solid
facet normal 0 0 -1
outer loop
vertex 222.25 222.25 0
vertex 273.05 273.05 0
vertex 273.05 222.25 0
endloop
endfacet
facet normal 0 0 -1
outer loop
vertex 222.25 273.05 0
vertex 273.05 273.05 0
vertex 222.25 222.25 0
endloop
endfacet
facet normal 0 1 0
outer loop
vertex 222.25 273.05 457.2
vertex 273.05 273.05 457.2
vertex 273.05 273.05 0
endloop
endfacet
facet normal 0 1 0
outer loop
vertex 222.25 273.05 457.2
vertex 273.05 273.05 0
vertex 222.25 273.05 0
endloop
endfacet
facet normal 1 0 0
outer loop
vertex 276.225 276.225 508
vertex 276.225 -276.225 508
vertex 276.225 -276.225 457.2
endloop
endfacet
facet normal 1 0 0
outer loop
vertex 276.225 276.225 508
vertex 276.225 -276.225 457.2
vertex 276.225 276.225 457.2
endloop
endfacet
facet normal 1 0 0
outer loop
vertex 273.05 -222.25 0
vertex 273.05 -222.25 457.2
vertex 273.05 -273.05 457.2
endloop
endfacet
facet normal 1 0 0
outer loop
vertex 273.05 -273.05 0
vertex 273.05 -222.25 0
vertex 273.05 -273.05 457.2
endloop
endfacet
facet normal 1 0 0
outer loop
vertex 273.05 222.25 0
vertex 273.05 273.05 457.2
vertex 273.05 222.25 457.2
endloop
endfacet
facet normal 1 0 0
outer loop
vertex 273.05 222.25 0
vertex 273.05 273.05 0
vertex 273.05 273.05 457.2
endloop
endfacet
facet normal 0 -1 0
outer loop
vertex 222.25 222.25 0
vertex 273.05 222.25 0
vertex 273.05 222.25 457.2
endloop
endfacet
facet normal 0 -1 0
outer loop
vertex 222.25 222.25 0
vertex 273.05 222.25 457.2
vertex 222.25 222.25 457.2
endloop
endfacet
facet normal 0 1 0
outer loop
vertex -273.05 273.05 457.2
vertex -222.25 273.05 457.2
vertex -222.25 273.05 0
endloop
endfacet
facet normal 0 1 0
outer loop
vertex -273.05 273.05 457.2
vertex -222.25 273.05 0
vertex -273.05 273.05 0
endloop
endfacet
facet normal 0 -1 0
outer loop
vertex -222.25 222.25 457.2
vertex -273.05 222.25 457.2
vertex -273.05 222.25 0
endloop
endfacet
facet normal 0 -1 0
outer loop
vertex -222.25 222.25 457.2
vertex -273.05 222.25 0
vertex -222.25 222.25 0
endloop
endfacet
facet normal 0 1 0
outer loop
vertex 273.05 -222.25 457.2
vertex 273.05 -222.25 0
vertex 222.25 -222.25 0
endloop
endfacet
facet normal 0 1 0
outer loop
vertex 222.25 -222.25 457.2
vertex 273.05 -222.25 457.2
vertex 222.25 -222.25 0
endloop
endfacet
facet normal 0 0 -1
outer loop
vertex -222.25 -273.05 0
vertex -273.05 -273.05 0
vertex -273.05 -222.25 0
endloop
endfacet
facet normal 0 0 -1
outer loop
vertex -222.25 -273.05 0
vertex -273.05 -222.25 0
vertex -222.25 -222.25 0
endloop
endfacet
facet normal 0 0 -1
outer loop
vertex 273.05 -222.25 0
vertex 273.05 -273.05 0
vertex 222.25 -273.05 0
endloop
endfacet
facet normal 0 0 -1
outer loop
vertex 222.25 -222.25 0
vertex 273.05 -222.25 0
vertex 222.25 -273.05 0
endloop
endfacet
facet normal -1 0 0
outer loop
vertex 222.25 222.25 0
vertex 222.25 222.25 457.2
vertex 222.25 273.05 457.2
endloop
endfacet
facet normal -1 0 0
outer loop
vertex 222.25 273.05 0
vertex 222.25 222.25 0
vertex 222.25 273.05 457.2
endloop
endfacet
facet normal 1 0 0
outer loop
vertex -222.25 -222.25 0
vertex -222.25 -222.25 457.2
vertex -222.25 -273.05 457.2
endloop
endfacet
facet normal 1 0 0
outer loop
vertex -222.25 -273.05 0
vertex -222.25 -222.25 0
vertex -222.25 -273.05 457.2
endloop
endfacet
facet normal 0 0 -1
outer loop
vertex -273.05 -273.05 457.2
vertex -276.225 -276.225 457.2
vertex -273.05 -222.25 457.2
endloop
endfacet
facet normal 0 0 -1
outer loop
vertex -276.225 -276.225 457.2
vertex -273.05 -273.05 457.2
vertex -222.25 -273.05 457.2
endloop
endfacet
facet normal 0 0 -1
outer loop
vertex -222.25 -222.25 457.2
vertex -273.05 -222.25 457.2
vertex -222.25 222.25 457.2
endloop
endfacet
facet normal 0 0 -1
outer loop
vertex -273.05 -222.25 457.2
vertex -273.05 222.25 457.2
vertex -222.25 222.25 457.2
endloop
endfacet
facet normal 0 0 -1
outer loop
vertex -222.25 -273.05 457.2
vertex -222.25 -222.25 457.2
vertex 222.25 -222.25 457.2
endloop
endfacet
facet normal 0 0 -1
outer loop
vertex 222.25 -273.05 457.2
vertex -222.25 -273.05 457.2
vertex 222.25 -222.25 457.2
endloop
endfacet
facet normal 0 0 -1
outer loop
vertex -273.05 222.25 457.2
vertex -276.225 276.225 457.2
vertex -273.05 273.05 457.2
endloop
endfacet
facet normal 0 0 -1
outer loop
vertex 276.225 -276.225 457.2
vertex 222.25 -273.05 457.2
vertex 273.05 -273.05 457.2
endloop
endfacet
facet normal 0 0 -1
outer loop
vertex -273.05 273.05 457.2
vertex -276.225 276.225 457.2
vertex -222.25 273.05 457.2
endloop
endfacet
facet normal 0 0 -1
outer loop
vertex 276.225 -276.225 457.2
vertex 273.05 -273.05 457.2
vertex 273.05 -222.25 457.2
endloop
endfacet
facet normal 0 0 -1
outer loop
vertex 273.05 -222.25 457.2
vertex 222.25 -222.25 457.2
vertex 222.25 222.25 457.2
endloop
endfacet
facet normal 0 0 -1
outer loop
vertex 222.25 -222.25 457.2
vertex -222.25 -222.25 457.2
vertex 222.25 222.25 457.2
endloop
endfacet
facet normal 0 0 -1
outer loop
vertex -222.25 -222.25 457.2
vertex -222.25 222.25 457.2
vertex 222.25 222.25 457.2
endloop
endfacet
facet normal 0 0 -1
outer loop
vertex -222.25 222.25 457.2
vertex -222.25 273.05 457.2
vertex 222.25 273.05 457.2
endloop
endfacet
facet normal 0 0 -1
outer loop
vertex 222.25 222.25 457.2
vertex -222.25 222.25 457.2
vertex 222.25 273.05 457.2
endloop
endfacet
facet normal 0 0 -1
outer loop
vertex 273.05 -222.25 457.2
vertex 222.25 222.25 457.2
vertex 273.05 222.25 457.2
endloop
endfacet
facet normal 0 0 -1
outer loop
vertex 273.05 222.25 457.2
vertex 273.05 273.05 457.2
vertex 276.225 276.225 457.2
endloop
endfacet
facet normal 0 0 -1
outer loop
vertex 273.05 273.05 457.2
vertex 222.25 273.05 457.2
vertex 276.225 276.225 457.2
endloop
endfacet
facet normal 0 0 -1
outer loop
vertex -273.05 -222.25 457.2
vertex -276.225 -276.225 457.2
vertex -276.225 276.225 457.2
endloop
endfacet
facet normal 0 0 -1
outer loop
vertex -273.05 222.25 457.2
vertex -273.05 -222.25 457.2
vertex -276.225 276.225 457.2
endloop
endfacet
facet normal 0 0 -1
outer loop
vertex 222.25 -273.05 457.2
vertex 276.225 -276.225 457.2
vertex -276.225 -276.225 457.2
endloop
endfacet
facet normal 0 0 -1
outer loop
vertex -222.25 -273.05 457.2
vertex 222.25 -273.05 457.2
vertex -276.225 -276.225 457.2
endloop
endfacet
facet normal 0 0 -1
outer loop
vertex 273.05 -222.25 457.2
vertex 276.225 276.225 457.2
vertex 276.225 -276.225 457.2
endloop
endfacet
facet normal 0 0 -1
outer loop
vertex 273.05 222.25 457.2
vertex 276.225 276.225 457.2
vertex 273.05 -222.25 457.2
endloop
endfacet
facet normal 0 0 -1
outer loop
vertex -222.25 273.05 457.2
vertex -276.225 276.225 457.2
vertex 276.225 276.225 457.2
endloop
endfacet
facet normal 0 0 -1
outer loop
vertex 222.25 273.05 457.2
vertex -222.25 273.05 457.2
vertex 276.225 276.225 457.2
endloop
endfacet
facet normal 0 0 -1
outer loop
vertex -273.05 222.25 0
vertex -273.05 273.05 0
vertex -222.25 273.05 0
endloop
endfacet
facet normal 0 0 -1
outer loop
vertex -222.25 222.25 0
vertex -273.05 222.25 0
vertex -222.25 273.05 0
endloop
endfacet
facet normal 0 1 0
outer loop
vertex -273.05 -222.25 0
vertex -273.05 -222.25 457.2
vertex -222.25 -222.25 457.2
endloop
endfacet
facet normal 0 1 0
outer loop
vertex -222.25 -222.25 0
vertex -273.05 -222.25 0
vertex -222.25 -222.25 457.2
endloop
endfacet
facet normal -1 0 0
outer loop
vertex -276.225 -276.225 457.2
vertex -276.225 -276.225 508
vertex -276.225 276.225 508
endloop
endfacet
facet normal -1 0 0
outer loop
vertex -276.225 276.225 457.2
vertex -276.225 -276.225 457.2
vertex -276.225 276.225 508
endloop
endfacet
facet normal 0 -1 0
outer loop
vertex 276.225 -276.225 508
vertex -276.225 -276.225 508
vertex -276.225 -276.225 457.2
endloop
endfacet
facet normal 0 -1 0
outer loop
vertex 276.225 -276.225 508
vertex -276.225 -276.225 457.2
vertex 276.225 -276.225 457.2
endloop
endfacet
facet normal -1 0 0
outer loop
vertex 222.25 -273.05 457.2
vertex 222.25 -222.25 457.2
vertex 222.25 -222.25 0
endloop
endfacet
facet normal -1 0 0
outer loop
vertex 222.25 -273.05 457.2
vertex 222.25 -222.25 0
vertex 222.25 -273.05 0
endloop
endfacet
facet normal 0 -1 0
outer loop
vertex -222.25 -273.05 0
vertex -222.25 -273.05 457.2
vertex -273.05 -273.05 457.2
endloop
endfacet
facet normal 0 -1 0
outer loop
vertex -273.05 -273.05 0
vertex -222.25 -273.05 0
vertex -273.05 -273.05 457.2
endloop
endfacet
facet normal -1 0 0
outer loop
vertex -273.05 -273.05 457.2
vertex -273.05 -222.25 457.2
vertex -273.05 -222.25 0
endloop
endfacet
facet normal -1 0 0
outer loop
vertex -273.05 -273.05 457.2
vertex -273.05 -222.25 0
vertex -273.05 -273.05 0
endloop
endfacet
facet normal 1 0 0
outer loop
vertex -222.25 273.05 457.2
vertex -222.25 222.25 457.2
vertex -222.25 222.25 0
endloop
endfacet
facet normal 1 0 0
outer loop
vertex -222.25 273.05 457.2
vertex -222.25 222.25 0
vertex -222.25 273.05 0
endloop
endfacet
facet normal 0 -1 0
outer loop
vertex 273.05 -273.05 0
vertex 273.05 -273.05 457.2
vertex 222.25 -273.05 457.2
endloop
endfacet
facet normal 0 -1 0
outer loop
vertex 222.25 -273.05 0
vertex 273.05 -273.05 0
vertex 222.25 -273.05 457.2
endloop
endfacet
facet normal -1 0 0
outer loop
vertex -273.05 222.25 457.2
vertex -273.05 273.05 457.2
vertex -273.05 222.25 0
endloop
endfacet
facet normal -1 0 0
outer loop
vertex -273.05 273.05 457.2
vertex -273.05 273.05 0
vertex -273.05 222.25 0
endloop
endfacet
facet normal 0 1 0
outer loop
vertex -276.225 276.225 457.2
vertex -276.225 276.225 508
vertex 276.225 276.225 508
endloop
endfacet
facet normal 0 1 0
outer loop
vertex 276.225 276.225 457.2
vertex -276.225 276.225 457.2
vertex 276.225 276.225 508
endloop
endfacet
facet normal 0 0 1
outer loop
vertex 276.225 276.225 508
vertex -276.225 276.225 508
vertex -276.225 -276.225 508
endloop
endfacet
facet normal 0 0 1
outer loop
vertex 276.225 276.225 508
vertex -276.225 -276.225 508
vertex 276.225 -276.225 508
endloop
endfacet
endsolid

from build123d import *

# Parameters (mm, degrees)
F1_W     = 50.8
F1_H     = 50.8
F2_DEPTH = 508
F5_W     = 50.8
F5_H     = 50.8
F6_DEPTH = 50.8
F8_W     = 552.45
F8_H     = 552.45
F8_W_2   = 546.1
F8_H_2   = 546.1
F9_DEPTH = 50.8


with BuildPart() as f2:
    # F1 (on Top) → F2 (new body)
    with BuildSketch(Plane.XY):
        with Locations((-247.65, 247.65)):
            Rectangle(F1_W, F1_H)
    extrude(amount=F2_DEPTH)


with BuildPart() as f3_1:
    # F3: instance of F2
    add(f2.part.mirror(Plane.YZ))


with BuildPart() as f4_1:
    # F4: instance of F2
    add(f2.part.mirror(Plane.XZ))


with BuildPart() as f4_2:
    # F4: instance of F3_1
    add(f3_1.part.mirror(Plane.XZ))


with BuildPart() as f6:
    # F5 (on face) → F6 (new body)
    with BuildSketch(Plane.XY.offset(508)):
        Polygon((-273.05, 222.25), (-273.05, -273.05), (273.05, -273.05), (273.05, 273.05), (-222.25, 273.05), (-222.25, 222.25), align=None)
        with Locations((-247.65, 247.65)):
            Rectangle(F5_W, F5_H)
    extrude(amount=-F6_DEPTH)


with BuildPart() as f2_1:
    add(f2.part)

    # F7: union F6, F3_1, F4_1, F4_2
    add(f6.part)
    add(f3_1.part)
    add(f4_1.part)
    add(f4_2.part)

    # F8 (on face) → F9 (join, through all)
    with BuildSketch(Plane.XY.offset(508)):
        Rectangle(F8_W, F8_H)
        Rectangle(F8_W_2, F8_H_2, mode=Mode.SUBTRACT)
    extrude(amount=-F9_DEPTH)


solid = f2_1.part
